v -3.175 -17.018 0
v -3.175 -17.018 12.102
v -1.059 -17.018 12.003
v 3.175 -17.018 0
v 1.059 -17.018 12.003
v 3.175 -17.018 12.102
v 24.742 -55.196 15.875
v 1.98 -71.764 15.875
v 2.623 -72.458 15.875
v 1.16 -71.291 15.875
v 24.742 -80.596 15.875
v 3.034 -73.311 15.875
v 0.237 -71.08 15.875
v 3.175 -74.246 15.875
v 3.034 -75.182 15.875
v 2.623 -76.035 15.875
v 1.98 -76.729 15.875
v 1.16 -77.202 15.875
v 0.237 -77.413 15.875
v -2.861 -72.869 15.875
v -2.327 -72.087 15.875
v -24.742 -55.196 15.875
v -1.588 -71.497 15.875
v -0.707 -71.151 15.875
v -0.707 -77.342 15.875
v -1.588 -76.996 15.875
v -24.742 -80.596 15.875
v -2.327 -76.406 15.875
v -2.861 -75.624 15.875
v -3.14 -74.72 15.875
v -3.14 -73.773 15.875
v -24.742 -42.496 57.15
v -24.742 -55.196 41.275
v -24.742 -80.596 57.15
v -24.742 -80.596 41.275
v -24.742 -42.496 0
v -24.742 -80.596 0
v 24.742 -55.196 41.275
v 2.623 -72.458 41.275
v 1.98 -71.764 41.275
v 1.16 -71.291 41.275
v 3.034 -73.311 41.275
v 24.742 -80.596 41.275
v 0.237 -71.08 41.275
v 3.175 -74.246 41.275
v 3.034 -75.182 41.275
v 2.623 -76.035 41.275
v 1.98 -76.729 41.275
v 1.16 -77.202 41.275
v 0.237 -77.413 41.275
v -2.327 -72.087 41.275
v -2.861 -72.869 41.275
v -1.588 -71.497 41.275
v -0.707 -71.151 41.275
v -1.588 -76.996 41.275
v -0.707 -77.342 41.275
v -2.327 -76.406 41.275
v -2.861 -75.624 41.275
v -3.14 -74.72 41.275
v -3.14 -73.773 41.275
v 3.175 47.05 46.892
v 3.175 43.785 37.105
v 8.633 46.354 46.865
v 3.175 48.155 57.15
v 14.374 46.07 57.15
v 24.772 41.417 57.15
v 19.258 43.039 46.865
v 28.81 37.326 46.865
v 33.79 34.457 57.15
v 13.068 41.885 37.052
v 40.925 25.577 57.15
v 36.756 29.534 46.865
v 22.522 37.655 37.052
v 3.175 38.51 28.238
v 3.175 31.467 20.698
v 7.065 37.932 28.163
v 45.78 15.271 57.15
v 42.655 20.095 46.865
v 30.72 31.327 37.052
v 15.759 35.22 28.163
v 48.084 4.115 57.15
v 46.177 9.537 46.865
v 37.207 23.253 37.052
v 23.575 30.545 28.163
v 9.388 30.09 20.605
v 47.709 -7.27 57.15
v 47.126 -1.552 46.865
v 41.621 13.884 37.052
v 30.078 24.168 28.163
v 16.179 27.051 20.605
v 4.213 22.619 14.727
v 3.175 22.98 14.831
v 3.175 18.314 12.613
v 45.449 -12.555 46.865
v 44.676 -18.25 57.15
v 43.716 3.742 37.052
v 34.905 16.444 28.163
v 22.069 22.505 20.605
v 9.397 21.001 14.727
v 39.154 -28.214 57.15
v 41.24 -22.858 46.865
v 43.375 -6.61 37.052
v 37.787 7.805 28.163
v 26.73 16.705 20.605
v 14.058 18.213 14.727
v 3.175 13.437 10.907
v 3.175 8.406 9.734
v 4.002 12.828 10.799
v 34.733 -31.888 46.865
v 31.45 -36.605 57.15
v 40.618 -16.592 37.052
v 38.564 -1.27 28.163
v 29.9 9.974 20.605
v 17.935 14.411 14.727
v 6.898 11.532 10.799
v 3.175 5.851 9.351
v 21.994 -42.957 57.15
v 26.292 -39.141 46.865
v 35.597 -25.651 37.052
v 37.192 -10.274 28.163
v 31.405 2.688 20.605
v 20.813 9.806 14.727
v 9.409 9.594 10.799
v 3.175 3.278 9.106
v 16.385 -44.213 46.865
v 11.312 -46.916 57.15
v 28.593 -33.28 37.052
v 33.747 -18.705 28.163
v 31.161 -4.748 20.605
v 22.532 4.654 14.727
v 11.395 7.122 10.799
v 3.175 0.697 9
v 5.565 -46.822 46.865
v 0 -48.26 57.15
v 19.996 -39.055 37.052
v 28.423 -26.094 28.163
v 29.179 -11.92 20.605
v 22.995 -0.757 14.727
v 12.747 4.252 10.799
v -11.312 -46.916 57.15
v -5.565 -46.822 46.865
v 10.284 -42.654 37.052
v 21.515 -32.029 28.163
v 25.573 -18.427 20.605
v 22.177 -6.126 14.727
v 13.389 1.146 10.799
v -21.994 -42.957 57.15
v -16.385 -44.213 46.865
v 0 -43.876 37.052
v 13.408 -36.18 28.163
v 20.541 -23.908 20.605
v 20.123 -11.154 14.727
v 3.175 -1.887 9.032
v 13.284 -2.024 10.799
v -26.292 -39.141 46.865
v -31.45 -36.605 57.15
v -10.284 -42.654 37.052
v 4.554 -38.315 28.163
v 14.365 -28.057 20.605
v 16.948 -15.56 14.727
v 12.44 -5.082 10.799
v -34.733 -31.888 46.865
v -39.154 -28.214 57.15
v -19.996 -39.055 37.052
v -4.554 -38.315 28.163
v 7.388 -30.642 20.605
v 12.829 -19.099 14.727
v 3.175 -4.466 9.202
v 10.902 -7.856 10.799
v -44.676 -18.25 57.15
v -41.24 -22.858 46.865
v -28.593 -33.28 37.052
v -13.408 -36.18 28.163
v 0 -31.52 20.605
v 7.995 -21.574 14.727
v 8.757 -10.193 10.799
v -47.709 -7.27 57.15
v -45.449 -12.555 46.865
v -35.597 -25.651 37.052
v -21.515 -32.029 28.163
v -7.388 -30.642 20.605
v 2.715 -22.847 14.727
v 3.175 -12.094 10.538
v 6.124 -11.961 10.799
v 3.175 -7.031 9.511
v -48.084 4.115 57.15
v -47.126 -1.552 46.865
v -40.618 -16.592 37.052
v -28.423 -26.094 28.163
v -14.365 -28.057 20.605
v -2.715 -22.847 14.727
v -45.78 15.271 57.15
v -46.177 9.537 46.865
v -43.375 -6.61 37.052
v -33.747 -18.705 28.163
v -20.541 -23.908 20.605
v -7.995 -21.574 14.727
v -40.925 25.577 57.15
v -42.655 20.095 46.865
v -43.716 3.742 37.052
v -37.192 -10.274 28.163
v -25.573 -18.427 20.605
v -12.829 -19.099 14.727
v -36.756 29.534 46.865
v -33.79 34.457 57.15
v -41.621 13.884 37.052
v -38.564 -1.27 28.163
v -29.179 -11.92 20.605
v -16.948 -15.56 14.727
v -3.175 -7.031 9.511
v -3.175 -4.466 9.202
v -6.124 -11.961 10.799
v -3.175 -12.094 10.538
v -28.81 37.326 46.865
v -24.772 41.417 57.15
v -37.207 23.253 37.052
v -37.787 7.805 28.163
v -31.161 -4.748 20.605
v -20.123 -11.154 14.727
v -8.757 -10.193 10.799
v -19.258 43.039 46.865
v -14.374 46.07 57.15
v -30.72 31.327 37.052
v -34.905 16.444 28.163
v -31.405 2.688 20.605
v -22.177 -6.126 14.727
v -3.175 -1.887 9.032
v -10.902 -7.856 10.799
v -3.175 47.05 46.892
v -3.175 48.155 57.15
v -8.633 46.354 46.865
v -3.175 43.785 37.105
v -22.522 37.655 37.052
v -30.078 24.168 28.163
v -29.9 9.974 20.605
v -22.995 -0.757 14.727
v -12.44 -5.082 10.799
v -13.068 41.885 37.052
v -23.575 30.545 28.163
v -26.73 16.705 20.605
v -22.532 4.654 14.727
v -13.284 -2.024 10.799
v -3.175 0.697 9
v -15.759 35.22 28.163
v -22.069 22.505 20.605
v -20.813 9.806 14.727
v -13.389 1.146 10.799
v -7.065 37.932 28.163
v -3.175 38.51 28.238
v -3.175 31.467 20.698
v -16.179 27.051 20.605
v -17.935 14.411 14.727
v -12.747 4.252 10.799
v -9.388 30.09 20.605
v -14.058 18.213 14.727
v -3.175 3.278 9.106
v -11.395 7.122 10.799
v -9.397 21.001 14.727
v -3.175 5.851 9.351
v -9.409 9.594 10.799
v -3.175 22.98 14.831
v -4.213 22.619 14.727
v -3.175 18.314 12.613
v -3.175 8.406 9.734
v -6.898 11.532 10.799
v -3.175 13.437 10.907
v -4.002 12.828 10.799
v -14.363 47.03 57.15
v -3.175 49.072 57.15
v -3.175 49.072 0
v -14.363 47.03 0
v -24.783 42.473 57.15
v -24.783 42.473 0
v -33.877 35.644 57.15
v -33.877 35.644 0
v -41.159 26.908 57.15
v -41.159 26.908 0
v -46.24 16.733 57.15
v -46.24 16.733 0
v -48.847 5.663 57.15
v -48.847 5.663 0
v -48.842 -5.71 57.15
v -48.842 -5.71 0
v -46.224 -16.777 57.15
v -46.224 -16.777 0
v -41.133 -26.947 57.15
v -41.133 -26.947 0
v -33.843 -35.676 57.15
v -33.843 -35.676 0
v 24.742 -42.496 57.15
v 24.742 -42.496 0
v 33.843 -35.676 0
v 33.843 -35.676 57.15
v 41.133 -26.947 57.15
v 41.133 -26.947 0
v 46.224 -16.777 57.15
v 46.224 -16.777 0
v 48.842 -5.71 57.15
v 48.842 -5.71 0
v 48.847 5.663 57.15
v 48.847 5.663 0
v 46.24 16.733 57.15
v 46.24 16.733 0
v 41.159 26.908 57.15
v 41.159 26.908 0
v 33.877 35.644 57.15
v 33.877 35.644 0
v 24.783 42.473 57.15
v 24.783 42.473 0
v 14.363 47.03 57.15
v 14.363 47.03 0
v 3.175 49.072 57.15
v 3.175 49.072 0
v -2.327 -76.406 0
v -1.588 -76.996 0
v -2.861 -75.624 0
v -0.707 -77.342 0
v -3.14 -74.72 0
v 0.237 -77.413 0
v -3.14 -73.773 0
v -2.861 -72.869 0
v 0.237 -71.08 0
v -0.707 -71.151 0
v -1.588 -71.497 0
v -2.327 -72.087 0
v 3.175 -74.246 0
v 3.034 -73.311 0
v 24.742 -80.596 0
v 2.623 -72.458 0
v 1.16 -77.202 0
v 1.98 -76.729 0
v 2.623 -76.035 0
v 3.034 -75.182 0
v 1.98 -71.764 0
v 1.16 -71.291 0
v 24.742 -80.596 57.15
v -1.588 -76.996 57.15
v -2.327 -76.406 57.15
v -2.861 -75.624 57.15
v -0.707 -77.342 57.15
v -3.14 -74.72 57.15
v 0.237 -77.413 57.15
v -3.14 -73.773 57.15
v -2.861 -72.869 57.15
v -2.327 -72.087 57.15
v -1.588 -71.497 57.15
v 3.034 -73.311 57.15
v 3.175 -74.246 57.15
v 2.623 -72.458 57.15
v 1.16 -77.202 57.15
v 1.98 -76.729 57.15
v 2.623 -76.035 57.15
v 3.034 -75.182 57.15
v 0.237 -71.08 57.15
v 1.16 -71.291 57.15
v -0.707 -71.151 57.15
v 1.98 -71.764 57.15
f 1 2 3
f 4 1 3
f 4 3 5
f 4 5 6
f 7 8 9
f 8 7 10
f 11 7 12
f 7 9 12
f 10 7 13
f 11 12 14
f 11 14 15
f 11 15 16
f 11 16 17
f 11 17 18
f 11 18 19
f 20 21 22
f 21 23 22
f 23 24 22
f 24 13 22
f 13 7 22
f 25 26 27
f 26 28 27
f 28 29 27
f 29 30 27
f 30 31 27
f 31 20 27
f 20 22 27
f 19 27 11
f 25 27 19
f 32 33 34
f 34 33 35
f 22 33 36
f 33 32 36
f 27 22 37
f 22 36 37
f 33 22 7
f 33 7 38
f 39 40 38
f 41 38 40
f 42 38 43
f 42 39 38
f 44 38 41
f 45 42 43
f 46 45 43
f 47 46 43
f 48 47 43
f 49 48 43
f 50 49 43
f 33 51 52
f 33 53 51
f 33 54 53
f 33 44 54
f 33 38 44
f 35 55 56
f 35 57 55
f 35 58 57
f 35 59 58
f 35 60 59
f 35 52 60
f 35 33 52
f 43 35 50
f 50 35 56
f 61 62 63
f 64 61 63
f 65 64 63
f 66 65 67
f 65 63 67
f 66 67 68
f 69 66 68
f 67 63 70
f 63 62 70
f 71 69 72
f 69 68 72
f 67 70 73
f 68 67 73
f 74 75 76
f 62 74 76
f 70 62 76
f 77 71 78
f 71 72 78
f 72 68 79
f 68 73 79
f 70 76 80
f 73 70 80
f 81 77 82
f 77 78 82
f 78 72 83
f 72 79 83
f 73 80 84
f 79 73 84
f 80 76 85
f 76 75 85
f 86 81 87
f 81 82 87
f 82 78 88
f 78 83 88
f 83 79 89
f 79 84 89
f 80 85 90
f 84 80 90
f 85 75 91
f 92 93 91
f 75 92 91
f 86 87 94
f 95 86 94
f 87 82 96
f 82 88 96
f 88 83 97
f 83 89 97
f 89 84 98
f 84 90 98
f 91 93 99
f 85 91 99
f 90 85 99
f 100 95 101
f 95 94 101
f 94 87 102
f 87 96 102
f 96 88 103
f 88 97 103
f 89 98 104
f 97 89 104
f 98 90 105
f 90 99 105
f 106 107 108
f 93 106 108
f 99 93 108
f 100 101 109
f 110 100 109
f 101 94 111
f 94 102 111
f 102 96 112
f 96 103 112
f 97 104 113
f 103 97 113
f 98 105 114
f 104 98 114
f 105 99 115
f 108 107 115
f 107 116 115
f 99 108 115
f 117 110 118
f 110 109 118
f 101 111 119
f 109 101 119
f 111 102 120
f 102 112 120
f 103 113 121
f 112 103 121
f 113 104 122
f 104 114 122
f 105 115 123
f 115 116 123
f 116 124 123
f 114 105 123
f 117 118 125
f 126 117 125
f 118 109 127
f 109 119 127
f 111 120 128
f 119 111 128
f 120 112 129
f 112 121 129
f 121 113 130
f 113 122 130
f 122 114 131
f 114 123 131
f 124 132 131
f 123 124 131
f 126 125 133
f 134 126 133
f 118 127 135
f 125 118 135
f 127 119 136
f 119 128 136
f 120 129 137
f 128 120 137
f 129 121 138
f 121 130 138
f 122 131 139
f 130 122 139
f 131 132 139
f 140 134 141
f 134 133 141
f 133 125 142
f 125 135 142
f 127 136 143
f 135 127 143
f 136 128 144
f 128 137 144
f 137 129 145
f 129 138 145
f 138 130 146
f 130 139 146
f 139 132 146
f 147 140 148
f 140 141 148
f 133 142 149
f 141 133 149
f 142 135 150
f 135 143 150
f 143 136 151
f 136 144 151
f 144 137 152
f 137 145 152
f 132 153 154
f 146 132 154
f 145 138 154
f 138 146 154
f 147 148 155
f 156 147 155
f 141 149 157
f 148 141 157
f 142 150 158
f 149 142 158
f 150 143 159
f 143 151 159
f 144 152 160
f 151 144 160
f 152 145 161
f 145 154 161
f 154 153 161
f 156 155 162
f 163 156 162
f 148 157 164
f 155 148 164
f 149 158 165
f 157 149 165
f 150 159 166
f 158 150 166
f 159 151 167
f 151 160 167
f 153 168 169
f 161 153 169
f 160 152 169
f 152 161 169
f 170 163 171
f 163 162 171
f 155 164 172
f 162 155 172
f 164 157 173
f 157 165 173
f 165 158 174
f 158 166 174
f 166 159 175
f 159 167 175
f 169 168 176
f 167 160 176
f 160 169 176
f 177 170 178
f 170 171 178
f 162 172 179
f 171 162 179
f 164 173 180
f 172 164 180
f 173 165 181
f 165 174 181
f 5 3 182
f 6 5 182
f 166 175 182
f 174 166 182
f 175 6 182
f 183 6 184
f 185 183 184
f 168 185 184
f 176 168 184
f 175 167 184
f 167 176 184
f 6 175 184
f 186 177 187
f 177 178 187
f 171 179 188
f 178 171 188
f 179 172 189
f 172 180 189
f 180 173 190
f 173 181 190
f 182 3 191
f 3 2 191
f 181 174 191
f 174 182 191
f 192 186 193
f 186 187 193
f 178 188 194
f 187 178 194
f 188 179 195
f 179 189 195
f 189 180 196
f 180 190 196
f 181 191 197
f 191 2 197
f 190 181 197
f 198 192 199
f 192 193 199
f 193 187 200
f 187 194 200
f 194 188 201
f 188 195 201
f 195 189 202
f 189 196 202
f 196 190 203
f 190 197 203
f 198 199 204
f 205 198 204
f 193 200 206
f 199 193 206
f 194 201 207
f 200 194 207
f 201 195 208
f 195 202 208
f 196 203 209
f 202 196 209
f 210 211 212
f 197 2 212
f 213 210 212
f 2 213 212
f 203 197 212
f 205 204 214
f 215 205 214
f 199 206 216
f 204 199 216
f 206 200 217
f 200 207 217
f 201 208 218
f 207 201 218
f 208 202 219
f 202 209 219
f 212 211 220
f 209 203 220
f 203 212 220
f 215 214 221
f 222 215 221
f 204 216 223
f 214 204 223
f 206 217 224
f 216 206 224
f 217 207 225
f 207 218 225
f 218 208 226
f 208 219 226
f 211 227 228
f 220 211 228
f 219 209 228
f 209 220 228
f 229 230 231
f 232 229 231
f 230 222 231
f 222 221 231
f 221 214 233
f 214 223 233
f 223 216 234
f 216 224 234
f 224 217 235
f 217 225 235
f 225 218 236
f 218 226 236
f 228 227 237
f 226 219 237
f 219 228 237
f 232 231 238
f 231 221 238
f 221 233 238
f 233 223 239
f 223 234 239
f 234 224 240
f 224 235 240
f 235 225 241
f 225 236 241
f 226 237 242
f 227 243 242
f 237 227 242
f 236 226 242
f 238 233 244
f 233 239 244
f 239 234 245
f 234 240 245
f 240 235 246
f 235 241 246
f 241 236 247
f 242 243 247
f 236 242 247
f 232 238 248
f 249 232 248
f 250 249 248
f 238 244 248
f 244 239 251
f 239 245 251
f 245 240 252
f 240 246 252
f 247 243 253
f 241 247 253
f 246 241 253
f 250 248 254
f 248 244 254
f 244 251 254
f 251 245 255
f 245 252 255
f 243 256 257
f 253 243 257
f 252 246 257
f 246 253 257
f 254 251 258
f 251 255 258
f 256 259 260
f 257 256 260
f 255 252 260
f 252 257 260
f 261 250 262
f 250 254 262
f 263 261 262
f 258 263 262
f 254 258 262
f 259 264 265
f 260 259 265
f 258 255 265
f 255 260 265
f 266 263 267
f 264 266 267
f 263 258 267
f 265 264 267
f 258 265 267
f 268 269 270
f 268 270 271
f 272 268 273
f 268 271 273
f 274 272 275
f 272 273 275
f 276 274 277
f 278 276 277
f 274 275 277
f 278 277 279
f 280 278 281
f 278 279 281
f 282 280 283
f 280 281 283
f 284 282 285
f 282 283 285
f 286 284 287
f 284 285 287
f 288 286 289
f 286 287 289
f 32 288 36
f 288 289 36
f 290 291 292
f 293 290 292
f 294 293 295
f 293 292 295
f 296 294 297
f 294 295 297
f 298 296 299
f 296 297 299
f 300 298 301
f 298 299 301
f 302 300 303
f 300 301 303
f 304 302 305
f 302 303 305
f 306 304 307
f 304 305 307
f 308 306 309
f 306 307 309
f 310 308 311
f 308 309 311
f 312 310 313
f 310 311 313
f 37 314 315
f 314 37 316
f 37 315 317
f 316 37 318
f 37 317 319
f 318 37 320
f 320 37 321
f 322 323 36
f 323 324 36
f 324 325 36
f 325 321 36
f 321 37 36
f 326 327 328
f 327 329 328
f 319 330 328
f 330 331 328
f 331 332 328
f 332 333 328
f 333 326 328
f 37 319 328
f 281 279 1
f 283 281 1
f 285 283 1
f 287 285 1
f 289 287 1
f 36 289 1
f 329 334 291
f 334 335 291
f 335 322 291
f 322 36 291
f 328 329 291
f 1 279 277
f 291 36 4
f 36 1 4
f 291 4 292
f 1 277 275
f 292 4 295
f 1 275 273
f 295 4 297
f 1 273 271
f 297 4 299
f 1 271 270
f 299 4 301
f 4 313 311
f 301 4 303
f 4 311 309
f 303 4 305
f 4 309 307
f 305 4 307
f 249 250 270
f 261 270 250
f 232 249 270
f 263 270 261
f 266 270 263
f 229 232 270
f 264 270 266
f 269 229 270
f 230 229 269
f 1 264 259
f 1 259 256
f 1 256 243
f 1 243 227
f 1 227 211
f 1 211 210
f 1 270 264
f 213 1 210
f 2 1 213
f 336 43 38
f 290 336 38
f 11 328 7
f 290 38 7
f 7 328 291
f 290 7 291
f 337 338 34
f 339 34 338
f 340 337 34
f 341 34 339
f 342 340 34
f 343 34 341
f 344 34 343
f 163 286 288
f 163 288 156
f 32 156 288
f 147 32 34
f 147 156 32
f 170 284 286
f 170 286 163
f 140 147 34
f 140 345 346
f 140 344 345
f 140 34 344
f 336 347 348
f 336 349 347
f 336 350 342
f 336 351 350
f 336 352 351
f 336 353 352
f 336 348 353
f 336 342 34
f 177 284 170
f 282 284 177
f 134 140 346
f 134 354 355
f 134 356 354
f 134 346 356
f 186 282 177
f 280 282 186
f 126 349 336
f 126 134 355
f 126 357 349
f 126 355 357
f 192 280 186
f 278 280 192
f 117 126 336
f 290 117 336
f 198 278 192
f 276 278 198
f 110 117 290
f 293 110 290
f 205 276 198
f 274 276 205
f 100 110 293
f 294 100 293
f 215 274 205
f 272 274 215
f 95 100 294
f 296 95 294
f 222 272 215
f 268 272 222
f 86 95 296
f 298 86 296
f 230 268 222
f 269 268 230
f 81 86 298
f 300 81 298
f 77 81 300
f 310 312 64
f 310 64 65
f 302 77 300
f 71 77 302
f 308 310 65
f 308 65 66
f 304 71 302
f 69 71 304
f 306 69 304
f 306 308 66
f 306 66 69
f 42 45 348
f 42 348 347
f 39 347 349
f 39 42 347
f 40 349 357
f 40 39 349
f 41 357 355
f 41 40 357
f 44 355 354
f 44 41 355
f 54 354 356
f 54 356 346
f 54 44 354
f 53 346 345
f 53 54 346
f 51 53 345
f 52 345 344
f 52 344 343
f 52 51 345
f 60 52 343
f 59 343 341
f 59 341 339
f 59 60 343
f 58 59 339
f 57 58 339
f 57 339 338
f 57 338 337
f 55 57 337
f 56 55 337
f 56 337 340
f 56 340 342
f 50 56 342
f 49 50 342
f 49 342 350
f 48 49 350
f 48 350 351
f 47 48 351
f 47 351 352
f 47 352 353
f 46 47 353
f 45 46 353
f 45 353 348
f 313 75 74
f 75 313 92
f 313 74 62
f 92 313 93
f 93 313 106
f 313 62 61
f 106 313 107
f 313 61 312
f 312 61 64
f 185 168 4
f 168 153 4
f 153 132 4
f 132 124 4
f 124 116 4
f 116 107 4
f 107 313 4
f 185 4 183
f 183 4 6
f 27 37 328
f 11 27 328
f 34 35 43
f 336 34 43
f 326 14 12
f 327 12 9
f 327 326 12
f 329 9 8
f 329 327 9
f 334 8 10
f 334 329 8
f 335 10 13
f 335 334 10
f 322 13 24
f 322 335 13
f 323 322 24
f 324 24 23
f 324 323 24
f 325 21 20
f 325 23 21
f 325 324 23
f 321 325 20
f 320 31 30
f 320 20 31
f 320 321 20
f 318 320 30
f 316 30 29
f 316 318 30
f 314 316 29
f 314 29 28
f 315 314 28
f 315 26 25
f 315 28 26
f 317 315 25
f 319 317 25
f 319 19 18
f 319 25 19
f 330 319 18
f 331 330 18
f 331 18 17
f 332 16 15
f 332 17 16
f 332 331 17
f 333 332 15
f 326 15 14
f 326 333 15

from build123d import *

# Parameters (mm, degrees)
F0_R          = 49.1744
F1_DEPTH      = 57.15
F4_W          = 6.35
F4_H          = 57.15
F5_DEPTH      = 127
F5_DEPTH_BACK = 17.018
F6_R          = 3.175
F7_DEPTH      = 57.15
F8_W          = 25.4
F8_H          = 25.4
F9_DEPTH      = 50.8


with BuildPart() as f1:
    # F0 (on Top) → F1 (new body)
    with BuildSketch(Plane.XY):
        Circle(F0_R)
    extrude(amount=F1_DEPTH)

    # F2 (on Front) → F3 (revolve, cut)
    with BuildSketch(Plane.XZ):
        with BuildLine():
            Line((0, 57.15), (-48.26, 57.15))
            ThreePointArc((-48.26, 57.15), (-34.1249732601, 23.0250267399), (0, 8.89))
            Line((0, 8.89), (0, 57.15))
        make_face()
    revolve(axis=Axis((0, 0, 33.02), (0, 0, -1)), mode=Mode.SUBTRACT)

    # F4 (on Front) → F5 (cut, two sides)
    with BuildSketch(Plane.XZ) as f5_sk:
        with Locations((0, 28.575)):
            Rectangle(F4_W, F4_H)
    extrude(amount=-F5_DEPTH, mode=Mode.SUBTRACT)
    extrude(f5_sk.sketch, amount=F5_DEPTH_BACK, mode=Mode.SUBTRACT)

    # F6 (on Top) → F7 (join)
    with BuildSketch(Plane.XY):
        with BuildLine():
            ThreePointArc((24.742076835, -42.4964851399), (0, -49.1744), (-24.742076835, -42.4964851399))
            Line((-24.742076835, -42.4964851399), (-24.742076835, -80.5964851399))
            Line((-24.742076835, -80.5964851399), (24.742076835, -80.5964851399))
            Line((24.742076835, -80.5964851399), (24.742076835, -42.4964851399))
        make_face()
        with Locations((0, -74.2464851399)):
            Circle(F6_R, mode=Mode.SUBTRACT)
    extrude(amount=F7_DEPTH)

    # F8 (on face) → F9 (cut)
    with BuildSketch(Plane(origin=(-24.742076835, 0, 0), x_dir=(0, -1, 0), z_dir=(-1, 0, 0))):
        with Locations((67.8964851399, 28.575)):
            Rectangle(F8_W, F8_H)
    extrude(amount=-F9_DEPTH, mode=Mode.SUBTRACT)


solid = f1.part
